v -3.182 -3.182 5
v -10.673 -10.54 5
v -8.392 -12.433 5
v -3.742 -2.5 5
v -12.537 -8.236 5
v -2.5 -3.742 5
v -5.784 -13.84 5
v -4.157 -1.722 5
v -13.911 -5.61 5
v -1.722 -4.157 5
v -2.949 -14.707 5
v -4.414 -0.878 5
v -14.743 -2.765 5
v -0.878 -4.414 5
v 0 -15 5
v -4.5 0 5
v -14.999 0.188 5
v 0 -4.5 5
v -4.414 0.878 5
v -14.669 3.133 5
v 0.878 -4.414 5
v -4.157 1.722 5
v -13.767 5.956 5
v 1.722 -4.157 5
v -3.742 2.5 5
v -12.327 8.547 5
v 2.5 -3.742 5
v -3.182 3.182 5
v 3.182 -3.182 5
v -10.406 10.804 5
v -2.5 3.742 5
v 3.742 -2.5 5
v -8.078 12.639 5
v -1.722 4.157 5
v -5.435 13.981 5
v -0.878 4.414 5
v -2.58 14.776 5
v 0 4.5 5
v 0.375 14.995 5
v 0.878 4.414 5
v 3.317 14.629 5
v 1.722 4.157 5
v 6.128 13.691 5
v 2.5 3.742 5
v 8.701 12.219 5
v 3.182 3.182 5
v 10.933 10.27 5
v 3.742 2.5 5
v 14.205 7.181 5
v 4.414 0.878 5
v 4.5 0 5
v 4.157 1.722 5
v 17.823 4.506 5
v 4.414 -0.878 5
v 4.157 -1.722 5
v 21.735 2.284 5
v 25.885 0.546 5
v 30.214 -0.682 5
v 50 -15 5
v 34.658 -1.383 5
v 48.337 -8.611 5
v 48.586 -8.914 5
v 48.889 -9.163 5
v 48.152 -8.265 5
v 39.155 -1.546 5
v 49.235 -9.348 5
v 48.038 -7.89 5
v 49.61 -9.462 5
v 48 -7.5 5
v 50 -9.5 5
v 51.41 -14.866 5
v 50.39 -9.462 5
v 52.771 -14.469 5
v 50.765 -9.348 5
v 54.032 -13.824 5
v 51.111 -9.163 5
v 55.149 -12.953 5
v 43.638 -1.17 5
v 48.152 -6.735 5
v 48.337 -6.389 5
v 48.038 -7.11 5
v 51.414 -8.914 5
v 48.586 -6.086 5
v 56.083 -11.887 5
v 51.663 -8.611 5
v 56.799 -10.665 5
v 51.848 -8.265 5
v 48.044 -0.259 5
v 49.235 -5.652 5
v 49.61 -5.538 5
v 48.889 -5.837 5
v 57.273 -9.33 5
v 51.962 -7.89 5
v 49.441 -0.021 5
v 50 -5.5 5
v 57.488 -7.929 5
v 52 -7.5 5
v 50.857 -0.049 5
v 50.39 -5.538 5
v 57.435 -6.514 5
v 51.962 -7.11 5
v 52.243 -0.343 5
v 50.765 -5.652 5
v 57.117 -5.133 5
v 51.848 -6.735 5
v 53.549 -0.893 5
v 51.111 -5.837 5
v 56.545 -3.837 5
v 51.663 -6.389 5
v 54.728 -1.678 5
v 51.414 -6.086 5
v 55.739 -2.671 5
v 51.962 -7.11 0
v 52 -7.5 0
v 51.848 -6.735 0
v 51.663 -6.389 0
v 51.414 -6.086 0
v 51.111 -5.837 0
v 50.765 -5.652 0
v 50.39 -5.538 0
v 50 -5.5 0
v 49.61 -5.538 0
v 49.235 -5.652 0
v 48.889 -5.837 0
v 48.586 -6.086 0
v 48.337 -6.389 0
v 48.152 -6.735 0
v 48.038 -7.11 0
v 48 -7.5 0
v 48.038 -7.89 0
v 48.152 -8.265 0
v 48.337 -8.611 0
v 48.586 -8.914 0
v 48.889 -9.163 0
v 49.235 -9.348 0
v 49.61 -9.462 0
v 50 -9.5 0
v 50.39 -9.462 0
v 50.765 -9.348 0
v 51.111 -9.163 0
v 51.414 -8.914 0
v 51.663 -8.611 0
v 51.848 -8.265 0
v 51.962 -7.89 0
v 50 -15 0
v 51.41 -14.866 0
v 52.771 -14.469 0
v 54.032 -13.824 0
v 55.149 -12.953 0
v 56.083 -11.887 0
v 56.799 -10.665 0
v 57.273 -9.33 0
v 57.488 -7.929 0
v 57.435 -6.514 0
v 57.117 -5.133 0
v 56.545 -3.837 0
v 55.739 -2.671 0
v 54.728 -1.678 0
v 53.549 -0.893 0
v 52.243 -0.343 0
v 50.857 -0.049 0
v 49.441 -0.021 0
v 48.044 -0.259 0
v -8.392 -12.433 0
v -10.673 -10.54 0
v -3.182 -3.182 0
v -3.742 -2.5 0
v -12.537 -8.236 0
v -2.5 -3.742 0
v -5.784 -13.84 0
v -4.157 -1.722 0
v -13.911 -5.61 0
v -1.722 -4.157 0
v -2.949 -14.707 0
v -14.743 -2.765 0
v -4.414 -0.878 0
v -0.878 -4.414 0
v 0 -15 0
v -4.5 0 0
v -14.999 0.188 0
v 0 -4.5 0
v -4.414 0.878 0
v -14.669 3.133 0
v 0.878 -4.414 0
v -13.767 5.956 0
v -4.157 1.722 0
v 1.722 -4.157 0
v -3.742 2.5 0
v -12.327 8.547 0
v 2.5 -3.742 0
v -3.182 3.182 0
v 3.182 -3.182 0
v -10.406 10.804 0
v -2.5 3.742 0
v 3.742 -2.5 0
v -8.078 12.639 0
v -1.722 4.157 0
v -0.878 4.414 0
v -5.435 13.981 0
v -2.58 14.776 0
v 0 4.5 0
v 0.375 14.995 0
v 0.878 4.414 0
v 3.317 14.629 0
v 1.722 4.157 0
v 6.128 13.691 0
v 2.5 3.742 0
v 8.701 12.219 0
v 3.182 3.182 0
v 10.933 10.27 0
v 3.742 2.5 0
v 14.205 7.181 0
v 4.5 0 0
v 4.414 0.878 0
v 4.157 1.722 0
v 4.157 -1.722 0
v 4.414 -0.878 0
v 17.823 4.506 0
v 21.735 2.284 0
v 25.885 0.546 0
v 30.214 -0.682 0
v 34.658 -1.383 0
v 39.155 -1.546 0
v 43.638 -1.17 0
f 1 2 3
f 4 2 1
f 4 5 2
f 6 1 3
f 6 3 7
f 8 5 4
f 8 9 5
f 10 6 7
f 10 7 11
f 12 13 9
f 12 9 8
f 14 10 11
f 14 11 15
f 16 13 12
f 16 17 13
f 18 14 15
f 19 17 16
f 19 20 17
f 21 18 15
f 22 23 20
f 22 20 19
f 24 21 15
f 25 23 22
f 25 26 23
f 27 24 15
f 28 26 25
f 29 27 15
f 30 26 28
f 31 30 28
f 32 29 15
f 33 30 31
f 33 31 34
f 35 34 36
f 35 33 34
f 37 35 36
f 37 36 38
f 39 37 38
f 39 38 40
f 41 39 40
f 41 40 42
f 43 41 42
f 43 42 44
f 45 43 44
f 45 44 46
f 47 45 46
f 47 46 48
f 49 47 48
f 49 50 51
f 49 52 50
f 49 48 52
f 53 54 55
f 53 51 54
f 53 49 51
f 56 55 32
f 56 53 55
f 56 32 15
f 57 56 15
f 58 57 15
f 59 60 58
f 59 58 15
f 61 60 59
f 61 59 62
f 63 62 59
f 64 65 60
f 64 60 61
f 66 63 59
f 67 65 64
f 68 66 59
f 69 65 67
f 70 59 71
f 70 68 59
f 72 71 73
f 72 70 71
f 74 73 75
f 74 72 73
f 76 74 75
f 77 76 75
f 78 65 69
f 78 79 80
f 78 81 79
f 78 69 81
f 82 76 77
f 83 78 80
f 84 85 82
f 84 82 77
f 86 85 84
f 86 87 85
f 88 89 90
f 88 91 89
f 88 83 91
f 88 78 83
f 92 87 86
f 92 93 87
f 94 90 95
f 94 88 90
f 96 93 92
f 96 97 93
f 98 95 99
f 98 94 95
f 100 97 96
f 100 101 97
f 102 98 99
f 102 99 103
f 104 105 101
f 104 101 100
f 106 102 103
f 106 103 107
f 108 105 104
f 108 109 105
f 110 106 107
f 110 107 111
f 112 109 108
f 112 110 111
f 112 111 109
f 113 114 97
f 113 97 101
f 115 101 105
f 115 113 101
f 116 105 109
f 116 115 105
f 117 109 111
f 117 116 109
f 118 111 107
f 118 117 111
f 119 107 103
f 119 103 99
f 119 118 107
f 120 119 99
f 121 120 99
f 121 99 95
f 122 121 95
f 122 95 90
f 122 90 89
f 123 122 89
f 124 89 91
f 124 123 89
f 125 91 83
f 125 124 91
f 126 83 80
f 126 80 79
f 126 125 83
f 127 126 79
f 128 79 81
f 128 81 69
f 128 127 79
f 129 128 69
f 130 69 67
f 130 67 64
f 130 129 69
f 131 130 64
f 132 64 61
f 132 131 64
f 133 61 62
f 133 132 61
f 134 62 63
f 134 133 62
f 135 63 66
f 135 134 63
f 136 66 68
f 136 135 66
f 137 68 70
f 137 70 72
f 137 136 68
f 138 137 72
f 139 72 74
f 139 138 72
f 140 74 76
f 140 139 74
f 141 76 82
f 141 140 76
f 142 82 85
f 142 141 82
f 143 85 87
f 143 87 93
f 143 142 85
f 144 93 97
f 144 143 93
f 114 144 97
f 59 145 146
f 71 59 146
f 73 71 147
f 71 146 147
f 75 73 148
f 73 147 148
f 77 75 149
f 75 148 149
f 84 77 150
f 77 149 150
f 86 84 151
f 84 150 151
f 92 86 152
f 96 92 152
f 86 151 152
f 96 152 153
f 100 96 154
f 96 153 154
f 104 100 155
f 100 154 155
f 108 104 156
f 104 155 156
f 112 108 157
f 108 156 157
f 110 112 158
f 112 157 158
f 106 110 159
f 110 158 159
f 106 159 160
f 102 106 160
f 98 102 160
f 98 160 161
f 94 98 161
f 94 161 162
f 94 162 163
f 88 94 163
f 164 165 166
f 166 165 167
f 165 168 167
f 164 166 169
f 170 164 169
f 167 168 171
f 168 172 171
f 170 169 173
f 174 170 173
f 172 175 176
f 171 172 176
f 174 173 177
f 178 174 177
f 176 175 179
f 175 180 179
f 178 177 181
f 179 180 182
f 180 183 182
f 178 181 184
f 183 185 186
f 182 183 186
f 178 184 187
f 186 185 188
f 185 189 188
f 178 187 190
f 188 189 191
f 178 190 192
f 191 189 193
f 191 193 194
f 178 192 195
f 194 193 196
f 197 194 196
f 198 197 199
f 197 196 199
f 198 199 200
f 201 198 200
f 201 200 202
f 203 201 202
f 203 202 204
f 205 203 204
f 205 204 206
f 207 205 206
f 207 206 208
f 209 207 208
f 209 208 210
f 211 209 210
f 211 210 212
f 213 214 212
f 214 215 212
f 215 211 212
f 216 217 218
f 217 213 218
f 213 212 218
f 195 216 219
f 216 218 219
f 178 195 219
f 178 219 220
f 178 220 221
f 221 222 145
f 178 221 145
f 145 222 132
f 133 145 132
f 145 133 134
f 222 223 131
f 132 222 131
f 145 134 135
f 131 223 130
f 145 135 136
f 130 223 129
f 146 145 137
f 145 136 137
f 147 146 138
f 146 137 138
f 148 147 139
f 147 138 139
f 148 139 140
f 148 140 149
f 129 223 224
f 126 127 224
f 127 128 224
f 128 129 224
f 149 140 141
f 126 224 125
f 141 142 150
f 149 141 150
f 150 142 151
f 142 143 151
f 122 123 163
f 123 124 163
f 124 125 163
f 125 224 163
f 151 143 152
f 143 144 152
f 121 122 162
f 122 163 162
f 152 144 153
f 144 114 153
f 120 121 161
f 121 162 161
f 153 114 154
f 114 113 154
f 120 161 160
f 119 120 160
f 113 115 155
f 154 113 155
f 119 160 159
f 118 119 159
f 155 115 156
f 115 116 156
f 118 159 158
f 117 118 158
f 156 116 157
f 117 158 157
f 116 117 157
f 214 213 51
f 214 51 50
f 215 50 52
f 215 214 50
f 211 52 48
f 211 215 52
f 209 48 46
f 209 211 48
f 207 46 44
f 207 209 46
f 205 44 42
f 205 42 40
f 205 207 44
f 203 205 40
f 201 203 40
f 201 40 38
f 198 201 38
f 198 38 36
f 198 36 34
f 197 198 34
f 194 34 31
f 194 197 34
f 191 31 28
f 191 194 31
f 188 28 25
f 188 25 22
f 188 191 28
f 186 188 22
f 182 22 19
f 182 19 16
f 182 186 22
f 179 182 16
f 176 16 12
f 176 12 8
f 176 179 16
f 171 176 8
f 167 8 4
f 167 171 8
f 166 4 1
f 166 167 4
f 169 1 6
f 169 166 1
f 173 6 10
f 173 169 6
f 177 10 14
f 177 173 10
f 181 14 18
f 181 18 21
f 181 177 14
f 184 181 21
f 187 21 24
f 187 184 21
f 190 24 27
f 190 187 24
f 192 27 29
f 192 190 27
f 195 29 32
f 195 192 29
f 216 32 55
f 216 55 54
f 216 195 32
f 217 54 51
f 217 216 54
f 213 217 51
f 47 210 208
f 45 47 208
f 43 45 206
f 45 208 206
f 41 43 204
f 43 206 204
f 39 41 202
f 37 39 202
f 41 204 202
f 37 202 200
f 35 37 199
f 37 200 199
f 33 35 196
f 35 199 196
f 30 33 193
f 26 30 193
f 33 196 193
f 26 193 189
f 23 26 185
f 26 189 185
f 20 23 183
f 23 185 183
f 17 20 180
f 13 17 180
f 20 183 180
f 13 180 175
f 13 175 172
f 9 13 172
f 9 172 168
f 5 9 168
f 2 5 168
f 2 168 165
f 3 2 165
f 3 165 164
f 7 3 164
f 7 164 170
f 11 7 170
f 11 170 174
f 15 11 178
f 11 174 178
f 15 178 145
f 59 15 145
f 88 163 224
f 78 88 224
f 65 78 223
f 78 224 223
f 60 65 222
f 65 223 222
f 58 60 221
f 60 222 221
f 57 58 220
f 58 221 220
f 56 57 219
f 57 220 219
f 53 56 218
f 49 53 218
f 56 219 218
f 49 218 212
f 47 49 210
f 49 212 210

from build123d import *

# Parameters (mm, degrees)
SCHIZZO1_R                   = 4.5
SCHIZZO1_R_2                 = 2
ESTRUSIONE_ESTRUSIONE1_DEPTH = 5


with BuildPart() as part:
    # Schizzo1 → Estrusione-Estrusione1 (new body)
    with BuildSketch(Plane.XY):
        with BuildLine():
            Line((0, -15), (50, -15))
            ThreePointArc((50, -15), (57.434856863, -6.513641332), (48.044417196, -0.259440913))
            ThreePointArc((48.044417196, -0.259440913), (28.031173765, -0.132787617), (10.933286622, 10.269529864))
            ThreePointArc((10.933286622, 10.269529864), (-13.766679846, 5.956385315), (0, -15))
        make_face()
        Circle(SCHIZZO1_R, mode=Mode.SUBTRACT)
        with Locations((50, -7.5)):
            Circle(SCHIZZO1_R_2, mode=Mode.SUBTRACT)
    extrude(amount=ESTRUSIONE_ESTRUSIONE1_DEPTH)


solid = part.part
